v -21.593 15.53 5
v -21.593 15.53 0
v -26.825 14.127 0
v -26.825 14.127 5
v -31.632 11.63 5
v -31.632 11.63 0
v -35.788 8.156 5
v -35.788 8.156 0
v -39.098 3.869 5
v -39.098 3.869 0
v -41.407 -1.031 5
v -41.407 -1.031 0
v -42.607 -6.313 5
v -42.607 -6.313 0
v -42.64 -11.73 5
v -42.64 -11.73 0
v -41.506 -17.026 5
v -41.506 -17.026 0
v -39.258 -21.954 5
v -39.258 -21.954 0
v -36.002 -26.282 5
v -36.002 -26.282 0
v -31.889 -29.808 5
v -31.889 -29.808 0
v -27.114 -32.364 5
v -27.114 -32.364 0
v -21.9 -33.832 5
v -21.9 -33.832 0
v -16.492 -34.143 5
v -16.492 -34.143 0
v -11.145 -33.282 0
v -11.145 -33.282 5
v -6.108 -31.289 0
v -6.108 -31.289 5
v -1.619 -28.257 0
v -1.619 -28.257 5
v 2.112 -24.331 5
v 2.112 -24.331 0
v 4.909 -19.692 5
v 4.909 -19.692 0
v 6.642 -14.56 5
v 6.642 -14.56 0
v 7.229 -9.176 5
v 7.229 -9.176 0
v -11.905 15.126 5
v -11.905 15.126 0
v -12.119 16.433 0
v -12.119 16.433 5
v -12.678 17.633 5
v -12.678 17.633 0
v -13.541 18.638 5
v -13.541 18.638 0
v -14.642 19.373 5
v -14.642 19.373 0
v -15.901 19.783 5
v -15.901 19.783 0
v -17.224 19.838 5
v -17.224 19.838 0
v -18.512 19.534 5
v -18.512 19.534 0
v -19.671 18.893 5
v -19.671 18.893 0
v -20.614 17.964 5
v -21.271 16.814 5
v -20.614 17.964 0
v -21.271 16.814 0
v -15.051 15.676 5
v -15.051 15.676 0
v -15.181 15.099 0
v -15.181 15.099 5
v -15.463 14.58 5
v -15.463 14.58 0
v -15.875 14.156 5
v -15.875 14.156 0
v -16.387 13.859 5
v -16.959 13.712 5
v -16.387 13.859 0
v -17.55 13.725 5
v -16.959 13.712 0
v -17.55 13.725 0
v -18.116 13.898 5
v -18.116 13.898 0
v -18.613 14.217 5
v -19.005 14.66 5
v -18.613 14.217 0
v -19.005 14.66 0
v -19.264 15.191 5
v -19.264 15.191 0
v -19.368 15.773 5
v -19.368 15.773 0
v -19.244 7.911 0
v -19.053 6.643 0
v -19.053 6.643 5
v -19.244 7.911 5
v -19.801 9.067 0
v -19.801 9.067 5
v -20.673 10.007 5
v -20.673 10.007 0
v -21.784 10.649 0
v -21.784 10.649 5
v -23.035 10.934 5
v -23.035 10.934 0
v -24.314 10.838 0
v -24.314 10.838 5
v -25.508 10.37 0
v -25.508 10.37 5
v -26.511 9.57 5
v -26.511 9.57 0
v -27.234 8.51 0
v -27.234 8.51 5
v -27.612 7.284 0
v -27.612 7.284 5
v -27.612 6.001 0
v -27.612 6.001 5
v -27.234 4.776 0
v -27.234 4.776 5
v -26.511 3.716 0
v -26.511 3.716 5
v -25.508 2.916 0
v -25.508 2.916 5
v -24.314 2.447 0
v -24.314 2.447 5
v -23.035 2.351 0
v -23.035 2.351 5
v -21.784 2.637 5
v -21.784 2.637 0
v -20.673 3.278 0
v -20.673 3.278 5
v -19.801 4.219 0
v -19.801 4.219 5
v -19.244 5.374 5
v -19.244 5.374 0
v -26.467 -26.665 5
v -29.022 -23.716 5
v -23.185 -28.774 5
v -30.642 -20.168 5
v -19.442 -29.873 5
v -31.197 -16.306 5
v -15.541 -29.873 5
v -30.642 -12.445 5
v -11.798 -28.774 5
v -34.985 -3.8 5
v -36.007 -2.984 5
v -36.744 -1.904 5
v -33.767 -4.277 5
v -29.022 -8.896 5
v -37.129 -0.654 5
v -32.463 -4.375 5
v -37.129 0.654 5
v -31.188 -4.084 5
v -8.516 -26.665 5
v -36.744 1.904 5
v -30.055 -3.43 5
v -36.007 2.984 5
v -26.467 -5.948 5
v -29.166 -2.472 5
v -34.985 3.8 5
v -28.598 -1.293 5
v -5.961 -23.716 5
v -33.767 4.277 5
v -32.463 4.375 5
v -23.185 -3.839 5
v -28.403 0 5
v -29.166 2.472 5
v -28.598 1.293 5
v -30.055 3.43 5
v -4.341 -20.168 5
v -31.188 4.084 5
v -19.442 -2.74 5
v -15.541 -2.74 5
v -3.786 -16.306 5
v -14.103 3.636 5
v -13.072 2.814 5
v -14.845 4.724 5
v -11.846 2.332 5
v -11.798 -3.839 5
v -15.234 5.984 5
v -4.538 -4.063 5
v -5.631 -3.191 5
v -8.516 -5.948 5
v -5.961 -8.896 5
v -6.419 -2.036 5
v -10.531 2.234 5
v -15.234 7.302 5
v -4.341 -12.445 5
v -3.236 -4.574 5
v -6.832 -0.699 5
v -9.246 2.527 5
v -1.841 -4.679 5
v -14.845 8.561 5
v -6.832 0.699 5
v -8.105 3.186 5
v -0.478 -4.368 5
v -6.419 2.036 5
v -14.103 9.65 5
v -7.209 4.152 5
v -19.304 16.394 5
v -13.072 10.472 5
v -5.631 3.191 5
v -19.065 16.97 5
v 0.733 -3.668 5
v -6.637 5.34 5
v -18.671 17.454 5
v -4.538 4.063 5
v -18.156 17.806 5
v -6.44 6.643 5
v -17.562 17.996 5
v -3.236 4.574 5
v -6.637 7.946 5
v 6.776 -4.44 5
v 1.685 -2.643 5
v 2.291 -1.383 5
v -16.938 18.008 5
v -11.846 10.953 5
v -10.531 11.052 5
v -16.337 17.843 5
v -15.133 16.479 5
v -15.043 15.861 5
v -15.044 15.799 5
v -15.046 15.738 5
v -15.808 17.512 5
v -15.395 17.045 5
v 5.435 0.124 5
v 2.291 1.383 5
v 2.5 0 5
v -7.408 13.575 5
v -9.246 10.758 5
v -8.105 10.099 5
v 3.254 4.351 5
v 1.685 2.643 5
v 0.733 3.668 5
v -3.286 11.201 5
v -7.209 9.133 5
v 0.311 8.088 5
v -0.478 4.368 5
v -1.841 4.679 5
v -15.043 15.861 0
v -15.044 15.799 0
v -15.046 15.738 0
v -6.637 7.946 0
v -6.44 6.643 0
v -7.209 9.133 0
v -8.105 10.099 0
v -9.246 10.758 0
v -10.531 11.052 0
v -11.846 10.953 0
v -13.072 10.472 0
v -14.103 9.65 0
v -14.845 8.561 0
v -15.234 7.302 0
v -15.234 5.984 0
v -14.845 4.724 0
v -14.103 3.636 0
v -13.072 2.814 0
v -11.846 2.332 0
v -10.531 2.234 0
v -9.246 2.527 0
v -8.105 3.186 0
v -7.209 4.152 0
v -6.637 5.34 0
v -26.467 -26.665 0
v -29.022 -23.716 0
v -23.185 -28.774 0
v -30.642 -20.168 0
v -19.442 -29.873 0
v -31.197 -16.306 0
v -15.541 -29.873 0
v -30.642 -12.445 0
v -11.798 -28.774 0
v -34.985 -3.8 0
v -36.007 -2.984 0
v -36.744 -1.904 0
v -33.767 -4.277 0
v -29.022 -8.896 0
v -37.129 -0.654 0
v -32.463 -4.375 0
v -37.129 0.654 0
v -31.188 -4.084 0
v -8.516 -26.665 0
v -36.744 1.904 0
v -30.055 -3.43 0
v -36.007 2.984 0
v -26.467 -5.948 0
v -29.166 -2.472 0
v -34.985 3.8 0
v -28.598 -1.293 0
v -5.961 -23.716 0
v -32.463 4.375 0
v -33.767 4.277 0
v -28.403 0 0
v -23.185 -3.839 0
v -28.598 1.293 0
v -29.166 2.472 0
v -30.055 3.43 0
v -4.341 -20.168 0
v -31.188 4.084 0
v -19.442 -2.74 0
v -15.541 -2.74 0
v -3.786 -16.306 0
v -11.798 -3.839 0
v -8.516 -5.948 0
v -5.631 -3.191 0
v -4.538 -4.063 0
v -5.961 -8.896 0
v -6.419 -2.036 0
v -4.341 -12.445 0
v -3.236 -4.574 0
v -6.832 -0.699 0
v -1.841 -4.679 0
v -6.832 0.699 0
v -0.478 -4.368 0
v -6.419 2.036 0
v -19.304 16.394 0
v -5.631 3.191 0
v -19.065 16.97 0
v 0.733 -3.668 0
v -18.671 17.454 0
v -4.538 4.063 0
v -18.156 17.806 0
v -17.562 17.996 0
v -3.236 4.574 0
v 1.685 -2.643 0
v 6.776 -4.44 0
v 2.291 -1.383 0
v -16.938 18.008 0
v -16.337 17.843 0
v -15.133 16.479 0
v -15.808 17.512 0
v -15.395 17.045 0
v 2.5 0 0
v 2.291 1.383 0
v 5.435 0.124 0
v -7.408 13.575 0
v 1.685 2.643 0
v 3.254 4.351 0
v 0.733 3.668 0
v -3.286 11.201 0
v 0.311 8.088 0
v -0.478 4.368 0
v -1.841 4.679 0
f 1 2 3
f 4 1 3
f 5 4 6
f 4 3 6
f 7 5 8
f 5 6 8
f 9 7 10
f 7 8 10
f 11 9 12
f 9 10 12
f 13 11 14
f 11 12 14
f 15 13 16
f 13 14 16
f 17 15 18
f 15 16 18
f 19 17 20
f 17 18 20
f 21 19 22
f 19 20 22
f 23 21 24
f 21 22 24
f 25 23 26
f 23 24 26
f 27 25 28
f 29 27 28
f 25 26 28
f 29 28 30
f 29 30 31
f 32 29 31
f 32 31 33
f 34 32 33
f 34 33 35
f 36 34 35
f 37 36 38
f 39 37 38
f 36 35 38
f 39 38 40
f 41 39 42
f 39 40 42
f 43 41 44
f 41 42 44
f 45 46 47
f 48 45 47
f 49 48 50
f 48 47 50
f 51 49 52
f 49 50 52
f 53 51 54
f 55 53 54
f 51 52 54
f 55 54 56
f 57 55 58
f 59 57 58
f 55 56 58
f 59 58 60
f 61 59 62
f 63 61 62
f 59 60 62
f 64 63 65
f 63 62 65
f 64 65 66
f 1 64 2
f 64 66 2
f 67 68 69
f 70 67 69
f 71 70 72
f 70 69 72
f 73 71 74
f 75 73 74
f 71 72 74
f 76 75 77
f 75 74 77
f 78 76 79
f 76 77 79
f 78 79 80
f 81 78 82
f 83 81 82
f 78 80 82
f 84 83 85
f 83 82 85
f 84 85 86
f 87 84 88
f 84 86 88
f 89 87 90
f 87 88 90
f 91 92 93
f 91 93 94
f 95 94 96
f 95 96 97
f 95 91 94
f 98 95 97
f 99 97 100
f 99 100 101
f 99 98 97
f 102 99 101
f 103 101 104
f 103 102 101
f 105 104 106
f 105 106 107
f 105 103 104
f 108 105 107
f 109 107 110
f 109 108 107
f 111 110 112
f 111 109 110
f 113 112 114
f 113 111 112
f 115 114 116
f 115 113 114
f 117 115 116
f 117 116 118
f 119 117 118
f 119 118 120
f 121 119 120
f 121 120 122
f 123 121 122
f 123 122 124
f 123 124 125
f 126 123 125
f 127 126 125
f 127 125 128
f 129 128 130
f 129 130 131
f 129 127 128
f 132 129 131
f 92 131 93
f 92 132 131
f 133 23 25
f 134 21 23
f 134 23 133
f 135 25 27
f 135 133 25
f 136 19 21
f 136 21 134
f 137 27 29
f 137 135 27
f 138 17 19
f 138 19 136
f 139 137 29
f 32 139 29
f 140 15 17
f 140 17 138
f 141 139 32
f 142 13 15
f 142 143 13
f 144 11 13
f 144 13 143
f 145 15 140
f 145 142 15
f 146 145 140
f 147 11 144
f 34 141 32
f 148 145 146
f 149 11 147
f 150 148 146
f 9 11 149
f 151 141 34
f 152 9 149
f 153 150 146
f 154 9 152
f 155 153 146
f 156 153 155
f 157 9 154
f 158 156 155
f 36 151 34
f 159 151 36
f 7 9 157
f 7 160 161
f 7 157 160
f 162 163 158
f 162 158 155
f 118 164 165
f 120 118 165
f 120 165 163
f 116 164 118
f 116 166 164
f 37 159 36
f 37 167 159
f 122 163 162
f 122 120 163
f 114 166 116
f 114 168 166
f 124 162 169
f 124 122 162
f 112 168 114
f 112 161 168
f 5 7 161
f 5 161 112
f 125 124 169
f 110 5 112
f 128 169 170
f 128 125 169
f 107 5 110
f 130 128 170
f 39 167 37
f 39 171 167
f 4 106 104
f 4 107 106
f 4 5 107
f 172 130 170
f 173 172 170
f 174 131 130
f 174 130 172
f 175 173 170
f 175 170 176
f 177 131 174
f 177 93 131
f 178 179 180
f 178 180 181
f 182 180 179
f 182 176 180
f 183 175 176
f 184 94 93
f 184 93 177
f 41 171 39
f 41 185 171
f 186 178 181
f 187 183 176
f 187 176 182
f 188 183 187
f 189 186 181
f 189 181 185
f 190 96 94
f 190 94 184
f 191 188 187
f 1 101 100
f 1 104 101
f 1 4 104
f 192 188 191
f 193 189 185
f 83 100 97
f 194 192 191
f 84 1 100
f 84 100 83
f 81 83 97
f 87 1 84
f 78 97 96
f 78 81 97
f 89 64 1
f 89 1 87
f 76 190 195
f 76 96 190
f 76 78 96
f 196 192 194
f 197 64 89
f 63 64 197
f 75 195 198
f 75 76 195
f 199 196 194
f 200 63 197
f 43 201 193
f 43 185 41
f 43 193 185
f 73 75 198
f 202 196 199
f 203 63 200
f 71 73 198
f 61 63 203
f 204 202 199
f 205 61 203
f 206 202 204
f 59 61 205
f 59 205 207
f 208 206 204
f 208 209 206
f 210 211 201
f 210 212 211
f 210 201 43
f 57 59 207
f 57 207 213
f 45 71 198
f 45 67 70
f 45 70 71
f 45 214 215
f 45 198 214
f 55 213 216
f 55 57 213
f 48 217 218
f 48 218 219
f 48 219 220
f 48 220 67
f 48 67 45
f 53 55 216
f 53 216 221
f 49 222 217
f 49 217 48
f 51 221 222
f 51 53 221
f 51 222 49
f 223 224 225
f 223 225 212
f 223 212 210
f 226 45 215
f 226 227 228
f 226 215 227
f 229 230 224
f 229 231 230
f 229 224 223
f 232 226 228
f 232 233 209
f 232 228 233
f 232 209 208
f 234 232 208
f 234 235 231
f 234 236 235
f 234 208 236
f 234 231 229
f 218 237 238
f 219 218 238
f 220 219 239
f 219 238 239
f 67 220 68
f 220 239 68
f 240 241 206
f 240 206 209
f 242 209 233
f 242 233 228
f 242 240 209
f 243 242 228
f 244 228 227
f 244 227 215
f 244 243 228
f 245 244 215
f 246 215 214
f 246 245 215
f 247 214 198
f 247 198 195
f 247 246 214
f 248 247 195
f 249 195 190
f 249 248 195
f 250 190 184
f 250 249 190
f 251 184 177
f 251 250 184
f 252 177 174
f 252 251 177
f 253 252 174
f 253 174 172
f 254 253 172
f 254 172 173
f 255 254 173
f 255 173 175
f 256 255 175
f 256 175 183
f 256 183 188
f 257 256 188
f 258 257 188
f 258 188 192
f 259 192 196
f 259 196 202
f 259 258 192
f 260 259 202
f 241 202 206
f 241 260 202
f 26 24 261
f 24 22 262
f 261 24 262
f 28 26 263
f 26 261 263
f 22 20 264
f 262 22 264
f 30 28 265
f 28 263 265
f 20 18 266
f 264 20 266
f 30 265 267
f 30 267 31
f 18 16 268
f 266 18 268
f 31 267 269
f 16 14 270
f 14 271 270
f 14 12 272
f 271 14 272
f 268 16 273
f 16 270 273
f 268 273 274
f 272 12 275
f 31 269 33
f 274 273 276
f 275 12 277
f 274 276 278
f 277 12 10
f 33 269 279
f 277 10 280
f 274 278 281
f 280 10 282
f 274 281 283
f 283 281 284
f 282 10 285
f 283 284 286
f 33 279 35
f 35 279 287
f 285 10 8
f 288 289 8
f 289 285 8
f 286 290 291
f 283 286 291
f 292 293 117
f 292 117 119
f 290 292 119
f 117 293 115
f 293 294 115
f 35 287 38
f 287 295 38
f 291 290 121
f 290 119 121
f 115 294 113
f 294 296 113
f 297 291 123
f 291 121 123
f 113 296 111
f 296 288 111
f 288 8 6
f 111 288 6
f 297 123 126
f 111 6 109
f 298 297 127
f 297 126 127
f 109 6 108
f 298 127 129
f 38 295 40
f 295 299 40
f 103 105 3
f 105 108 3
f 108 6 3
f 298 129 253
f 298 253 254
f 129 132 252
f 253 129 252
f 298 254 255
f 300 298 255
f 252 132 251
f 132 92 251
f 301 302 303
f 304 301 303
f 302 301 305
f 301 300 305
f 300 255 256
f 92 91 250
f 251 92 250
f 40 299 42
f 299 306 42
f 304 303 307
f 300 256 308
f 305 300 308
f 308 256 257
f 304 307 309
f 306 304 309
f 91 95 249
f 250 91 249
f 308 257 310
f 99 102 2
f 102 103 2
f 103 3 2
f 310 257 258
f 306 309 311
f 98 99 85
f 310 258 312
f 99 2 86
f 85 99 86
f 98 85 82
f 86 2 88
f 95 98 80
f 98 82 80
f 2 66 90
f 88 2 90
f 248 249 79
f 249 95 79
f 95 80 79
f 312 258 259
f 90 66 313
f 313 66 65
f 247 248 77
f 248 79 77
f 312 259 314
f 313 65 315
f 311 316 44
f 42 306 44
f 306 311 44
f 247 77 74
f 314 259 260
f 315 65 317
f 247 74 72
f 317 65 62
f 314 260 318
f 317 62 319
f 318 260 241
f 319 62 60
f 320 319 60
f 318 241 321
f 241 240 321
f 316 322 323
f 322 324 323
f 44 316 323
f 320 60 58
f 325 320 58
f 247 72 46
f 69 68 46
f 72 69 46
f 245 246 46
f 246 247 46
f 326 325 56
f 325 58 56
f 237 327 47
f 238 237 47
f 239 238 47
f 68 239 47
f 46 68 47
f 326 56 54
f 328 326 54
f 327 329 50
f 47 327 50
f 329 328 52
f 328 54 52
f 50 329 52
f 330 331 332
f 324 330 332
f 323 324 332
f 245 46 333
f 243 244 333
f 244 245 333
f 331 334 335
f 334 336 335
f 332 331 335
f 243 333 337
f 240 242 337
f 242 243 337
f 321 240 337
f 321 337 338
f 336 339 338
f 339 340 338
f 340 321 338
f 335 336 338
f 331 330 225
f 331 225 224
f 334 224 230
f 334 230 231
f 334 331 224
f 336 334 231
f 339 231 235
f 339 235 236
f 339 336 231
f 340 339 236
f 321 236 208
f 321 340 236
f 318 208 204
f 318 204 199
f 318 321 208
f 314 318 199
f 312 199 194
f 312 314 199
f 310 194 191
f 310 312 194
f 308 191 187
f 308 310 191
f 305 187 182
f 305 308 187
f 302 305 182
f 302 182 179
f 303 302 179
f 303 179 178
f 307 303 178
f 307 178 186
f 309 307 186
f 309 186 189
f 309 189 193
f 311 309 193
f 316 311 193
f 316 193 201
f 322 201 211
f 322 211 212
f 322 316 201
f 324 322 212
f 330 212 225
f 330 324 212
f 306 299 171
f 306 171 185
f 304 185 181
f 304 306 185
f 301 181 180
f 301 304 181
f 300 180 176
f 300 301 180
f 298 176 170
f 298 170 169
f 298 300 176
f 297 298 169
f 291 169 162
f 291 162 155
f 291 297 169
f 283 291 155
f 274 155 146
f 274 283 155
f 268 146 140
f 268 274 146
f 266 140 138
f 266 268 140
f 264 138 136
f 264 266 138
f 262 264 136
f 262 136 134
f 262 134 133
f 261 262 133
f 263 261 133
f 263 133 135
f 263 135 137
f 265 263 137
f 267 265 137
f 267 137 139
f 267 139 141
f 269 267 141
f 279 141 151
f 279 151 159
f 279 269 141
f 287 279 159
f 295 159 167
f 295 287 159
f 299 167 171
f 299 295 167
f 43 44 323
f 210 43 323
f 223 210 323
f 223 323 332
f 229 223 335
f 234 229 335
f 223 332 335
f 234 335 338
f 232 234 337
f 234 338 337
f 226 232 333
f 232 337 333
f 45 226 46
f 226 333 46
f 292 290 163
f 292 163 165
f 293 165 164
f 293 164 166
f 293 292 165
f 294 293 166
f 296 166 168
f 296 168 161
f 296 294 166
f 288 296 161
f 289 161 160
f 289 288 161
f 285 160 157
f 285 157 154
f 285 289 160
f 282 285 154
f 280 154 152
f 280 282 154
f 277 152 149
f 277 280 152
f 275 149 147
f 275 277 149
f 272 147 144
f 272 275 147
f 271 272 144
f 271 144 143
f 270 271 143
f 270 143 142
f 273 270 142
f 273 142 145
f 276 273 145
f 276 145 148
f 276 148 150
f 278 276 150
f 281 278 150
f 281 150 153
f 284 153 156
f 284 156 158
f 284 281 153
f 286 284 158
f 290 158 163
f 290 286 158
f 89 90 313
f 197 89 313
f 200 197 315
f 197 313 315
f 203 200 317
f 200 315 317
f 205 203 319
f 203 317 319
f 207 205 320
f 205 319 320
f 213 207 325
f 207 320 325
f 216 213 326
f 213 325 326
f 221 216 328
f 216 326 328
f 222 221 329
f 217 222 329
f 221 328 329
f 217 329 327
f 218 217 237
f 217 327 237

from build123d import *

# Parameters (mm, degrees)
F0_R     = 13.705866293
F0_R_2   = 4.3874864706
F0_R_3   = 4.303486485
F0_R_4   = 4.6919029461
F0_R_5   = 4.4212893062
F1_DEPTH = 5


# Not quite as in the source:
# - a feature names something its author has since deleted; it is built from what else it names


with BuildPart() as f1:
    # F0 (on Top) → F1 (new body)
    with BuildSketch(Plane.XY):
        with BuildLine():
            ThreePointArc((-21.5933528567, 15.5303339684), (-34.0411472206, -28.1567693277), (7.2290643581, -9.1757204846))
            ThreePointArc((7.2290643581, -9.1757204846), (1.8714254099, 6.2896489682), (-11.9051478269, 15.1263891627))
            ThreePointArc((-11.9051478269, 15.1263891627), (-13.4691027147, 15.4513831507), (-15.0506199283, 15.6758364569))
            ThreePointArc((-15.0506199283, 15.6758364569), (-17.255118812, 13.6982838706), (-19.3682330997, 15.77320015))
            ThreePointArc((-19.3682330997, 15.77320015), (-20.4835124203, 15.6766823614), (-21.5933528567, 15.5303339684))
        make_face()
        with Locations((-17.4914449453, -16.3063649088)):
            Circle(F0_R, mode=Mode.SUBTRACT)
        with Locations((-32.7908843756, 0)):
            Circle(F0_R_2, mode=Mode.SUBTRACT)
        with Locations((-23.3562290668, 6.6427942365)):
            Circle(F0_R_3, mode=Mode.SUBTRACT)
        with Locations((-2.1920050494, 0)):
            Circle(F0_R_4, mode=Mode.SUBTRACT)
        with Locations((-10.8616864309, 6.6427942365)):
            Circle(F0_R_5, mode=Mode.SUBTRACT)
        with BuildLine():
            ThreePointArc((-15.0506199283, 15.6758364569), (-13.4691027147, 15.4513831507), (-11.9051478269, 15.1263891627))
            ThreePointArc((-11.9051478269, 15.1263891627), (-16.560489471, 19.8555989303), (-21.5933528567, 15.5303339684))
            ThreePointArc((-21.5933528567, 15.5303339684), (-20.4835124203, 15.6766823614), (-19.3682330997, 15.77320015))
            ThreePointArc((-19.3682330997, 15.77320015), (-17.2504619715, 18.0246709507), (-15.0426456956, 15.8614274114))
            ThreePointArc((-15.0426456956, 15.8614274114), (-15.044640173, 15.768546317), (-15.0506199283, 15.6758364569))
        make_face()
    extrude(amount=F1_DEPTH)


solid = f1.part
